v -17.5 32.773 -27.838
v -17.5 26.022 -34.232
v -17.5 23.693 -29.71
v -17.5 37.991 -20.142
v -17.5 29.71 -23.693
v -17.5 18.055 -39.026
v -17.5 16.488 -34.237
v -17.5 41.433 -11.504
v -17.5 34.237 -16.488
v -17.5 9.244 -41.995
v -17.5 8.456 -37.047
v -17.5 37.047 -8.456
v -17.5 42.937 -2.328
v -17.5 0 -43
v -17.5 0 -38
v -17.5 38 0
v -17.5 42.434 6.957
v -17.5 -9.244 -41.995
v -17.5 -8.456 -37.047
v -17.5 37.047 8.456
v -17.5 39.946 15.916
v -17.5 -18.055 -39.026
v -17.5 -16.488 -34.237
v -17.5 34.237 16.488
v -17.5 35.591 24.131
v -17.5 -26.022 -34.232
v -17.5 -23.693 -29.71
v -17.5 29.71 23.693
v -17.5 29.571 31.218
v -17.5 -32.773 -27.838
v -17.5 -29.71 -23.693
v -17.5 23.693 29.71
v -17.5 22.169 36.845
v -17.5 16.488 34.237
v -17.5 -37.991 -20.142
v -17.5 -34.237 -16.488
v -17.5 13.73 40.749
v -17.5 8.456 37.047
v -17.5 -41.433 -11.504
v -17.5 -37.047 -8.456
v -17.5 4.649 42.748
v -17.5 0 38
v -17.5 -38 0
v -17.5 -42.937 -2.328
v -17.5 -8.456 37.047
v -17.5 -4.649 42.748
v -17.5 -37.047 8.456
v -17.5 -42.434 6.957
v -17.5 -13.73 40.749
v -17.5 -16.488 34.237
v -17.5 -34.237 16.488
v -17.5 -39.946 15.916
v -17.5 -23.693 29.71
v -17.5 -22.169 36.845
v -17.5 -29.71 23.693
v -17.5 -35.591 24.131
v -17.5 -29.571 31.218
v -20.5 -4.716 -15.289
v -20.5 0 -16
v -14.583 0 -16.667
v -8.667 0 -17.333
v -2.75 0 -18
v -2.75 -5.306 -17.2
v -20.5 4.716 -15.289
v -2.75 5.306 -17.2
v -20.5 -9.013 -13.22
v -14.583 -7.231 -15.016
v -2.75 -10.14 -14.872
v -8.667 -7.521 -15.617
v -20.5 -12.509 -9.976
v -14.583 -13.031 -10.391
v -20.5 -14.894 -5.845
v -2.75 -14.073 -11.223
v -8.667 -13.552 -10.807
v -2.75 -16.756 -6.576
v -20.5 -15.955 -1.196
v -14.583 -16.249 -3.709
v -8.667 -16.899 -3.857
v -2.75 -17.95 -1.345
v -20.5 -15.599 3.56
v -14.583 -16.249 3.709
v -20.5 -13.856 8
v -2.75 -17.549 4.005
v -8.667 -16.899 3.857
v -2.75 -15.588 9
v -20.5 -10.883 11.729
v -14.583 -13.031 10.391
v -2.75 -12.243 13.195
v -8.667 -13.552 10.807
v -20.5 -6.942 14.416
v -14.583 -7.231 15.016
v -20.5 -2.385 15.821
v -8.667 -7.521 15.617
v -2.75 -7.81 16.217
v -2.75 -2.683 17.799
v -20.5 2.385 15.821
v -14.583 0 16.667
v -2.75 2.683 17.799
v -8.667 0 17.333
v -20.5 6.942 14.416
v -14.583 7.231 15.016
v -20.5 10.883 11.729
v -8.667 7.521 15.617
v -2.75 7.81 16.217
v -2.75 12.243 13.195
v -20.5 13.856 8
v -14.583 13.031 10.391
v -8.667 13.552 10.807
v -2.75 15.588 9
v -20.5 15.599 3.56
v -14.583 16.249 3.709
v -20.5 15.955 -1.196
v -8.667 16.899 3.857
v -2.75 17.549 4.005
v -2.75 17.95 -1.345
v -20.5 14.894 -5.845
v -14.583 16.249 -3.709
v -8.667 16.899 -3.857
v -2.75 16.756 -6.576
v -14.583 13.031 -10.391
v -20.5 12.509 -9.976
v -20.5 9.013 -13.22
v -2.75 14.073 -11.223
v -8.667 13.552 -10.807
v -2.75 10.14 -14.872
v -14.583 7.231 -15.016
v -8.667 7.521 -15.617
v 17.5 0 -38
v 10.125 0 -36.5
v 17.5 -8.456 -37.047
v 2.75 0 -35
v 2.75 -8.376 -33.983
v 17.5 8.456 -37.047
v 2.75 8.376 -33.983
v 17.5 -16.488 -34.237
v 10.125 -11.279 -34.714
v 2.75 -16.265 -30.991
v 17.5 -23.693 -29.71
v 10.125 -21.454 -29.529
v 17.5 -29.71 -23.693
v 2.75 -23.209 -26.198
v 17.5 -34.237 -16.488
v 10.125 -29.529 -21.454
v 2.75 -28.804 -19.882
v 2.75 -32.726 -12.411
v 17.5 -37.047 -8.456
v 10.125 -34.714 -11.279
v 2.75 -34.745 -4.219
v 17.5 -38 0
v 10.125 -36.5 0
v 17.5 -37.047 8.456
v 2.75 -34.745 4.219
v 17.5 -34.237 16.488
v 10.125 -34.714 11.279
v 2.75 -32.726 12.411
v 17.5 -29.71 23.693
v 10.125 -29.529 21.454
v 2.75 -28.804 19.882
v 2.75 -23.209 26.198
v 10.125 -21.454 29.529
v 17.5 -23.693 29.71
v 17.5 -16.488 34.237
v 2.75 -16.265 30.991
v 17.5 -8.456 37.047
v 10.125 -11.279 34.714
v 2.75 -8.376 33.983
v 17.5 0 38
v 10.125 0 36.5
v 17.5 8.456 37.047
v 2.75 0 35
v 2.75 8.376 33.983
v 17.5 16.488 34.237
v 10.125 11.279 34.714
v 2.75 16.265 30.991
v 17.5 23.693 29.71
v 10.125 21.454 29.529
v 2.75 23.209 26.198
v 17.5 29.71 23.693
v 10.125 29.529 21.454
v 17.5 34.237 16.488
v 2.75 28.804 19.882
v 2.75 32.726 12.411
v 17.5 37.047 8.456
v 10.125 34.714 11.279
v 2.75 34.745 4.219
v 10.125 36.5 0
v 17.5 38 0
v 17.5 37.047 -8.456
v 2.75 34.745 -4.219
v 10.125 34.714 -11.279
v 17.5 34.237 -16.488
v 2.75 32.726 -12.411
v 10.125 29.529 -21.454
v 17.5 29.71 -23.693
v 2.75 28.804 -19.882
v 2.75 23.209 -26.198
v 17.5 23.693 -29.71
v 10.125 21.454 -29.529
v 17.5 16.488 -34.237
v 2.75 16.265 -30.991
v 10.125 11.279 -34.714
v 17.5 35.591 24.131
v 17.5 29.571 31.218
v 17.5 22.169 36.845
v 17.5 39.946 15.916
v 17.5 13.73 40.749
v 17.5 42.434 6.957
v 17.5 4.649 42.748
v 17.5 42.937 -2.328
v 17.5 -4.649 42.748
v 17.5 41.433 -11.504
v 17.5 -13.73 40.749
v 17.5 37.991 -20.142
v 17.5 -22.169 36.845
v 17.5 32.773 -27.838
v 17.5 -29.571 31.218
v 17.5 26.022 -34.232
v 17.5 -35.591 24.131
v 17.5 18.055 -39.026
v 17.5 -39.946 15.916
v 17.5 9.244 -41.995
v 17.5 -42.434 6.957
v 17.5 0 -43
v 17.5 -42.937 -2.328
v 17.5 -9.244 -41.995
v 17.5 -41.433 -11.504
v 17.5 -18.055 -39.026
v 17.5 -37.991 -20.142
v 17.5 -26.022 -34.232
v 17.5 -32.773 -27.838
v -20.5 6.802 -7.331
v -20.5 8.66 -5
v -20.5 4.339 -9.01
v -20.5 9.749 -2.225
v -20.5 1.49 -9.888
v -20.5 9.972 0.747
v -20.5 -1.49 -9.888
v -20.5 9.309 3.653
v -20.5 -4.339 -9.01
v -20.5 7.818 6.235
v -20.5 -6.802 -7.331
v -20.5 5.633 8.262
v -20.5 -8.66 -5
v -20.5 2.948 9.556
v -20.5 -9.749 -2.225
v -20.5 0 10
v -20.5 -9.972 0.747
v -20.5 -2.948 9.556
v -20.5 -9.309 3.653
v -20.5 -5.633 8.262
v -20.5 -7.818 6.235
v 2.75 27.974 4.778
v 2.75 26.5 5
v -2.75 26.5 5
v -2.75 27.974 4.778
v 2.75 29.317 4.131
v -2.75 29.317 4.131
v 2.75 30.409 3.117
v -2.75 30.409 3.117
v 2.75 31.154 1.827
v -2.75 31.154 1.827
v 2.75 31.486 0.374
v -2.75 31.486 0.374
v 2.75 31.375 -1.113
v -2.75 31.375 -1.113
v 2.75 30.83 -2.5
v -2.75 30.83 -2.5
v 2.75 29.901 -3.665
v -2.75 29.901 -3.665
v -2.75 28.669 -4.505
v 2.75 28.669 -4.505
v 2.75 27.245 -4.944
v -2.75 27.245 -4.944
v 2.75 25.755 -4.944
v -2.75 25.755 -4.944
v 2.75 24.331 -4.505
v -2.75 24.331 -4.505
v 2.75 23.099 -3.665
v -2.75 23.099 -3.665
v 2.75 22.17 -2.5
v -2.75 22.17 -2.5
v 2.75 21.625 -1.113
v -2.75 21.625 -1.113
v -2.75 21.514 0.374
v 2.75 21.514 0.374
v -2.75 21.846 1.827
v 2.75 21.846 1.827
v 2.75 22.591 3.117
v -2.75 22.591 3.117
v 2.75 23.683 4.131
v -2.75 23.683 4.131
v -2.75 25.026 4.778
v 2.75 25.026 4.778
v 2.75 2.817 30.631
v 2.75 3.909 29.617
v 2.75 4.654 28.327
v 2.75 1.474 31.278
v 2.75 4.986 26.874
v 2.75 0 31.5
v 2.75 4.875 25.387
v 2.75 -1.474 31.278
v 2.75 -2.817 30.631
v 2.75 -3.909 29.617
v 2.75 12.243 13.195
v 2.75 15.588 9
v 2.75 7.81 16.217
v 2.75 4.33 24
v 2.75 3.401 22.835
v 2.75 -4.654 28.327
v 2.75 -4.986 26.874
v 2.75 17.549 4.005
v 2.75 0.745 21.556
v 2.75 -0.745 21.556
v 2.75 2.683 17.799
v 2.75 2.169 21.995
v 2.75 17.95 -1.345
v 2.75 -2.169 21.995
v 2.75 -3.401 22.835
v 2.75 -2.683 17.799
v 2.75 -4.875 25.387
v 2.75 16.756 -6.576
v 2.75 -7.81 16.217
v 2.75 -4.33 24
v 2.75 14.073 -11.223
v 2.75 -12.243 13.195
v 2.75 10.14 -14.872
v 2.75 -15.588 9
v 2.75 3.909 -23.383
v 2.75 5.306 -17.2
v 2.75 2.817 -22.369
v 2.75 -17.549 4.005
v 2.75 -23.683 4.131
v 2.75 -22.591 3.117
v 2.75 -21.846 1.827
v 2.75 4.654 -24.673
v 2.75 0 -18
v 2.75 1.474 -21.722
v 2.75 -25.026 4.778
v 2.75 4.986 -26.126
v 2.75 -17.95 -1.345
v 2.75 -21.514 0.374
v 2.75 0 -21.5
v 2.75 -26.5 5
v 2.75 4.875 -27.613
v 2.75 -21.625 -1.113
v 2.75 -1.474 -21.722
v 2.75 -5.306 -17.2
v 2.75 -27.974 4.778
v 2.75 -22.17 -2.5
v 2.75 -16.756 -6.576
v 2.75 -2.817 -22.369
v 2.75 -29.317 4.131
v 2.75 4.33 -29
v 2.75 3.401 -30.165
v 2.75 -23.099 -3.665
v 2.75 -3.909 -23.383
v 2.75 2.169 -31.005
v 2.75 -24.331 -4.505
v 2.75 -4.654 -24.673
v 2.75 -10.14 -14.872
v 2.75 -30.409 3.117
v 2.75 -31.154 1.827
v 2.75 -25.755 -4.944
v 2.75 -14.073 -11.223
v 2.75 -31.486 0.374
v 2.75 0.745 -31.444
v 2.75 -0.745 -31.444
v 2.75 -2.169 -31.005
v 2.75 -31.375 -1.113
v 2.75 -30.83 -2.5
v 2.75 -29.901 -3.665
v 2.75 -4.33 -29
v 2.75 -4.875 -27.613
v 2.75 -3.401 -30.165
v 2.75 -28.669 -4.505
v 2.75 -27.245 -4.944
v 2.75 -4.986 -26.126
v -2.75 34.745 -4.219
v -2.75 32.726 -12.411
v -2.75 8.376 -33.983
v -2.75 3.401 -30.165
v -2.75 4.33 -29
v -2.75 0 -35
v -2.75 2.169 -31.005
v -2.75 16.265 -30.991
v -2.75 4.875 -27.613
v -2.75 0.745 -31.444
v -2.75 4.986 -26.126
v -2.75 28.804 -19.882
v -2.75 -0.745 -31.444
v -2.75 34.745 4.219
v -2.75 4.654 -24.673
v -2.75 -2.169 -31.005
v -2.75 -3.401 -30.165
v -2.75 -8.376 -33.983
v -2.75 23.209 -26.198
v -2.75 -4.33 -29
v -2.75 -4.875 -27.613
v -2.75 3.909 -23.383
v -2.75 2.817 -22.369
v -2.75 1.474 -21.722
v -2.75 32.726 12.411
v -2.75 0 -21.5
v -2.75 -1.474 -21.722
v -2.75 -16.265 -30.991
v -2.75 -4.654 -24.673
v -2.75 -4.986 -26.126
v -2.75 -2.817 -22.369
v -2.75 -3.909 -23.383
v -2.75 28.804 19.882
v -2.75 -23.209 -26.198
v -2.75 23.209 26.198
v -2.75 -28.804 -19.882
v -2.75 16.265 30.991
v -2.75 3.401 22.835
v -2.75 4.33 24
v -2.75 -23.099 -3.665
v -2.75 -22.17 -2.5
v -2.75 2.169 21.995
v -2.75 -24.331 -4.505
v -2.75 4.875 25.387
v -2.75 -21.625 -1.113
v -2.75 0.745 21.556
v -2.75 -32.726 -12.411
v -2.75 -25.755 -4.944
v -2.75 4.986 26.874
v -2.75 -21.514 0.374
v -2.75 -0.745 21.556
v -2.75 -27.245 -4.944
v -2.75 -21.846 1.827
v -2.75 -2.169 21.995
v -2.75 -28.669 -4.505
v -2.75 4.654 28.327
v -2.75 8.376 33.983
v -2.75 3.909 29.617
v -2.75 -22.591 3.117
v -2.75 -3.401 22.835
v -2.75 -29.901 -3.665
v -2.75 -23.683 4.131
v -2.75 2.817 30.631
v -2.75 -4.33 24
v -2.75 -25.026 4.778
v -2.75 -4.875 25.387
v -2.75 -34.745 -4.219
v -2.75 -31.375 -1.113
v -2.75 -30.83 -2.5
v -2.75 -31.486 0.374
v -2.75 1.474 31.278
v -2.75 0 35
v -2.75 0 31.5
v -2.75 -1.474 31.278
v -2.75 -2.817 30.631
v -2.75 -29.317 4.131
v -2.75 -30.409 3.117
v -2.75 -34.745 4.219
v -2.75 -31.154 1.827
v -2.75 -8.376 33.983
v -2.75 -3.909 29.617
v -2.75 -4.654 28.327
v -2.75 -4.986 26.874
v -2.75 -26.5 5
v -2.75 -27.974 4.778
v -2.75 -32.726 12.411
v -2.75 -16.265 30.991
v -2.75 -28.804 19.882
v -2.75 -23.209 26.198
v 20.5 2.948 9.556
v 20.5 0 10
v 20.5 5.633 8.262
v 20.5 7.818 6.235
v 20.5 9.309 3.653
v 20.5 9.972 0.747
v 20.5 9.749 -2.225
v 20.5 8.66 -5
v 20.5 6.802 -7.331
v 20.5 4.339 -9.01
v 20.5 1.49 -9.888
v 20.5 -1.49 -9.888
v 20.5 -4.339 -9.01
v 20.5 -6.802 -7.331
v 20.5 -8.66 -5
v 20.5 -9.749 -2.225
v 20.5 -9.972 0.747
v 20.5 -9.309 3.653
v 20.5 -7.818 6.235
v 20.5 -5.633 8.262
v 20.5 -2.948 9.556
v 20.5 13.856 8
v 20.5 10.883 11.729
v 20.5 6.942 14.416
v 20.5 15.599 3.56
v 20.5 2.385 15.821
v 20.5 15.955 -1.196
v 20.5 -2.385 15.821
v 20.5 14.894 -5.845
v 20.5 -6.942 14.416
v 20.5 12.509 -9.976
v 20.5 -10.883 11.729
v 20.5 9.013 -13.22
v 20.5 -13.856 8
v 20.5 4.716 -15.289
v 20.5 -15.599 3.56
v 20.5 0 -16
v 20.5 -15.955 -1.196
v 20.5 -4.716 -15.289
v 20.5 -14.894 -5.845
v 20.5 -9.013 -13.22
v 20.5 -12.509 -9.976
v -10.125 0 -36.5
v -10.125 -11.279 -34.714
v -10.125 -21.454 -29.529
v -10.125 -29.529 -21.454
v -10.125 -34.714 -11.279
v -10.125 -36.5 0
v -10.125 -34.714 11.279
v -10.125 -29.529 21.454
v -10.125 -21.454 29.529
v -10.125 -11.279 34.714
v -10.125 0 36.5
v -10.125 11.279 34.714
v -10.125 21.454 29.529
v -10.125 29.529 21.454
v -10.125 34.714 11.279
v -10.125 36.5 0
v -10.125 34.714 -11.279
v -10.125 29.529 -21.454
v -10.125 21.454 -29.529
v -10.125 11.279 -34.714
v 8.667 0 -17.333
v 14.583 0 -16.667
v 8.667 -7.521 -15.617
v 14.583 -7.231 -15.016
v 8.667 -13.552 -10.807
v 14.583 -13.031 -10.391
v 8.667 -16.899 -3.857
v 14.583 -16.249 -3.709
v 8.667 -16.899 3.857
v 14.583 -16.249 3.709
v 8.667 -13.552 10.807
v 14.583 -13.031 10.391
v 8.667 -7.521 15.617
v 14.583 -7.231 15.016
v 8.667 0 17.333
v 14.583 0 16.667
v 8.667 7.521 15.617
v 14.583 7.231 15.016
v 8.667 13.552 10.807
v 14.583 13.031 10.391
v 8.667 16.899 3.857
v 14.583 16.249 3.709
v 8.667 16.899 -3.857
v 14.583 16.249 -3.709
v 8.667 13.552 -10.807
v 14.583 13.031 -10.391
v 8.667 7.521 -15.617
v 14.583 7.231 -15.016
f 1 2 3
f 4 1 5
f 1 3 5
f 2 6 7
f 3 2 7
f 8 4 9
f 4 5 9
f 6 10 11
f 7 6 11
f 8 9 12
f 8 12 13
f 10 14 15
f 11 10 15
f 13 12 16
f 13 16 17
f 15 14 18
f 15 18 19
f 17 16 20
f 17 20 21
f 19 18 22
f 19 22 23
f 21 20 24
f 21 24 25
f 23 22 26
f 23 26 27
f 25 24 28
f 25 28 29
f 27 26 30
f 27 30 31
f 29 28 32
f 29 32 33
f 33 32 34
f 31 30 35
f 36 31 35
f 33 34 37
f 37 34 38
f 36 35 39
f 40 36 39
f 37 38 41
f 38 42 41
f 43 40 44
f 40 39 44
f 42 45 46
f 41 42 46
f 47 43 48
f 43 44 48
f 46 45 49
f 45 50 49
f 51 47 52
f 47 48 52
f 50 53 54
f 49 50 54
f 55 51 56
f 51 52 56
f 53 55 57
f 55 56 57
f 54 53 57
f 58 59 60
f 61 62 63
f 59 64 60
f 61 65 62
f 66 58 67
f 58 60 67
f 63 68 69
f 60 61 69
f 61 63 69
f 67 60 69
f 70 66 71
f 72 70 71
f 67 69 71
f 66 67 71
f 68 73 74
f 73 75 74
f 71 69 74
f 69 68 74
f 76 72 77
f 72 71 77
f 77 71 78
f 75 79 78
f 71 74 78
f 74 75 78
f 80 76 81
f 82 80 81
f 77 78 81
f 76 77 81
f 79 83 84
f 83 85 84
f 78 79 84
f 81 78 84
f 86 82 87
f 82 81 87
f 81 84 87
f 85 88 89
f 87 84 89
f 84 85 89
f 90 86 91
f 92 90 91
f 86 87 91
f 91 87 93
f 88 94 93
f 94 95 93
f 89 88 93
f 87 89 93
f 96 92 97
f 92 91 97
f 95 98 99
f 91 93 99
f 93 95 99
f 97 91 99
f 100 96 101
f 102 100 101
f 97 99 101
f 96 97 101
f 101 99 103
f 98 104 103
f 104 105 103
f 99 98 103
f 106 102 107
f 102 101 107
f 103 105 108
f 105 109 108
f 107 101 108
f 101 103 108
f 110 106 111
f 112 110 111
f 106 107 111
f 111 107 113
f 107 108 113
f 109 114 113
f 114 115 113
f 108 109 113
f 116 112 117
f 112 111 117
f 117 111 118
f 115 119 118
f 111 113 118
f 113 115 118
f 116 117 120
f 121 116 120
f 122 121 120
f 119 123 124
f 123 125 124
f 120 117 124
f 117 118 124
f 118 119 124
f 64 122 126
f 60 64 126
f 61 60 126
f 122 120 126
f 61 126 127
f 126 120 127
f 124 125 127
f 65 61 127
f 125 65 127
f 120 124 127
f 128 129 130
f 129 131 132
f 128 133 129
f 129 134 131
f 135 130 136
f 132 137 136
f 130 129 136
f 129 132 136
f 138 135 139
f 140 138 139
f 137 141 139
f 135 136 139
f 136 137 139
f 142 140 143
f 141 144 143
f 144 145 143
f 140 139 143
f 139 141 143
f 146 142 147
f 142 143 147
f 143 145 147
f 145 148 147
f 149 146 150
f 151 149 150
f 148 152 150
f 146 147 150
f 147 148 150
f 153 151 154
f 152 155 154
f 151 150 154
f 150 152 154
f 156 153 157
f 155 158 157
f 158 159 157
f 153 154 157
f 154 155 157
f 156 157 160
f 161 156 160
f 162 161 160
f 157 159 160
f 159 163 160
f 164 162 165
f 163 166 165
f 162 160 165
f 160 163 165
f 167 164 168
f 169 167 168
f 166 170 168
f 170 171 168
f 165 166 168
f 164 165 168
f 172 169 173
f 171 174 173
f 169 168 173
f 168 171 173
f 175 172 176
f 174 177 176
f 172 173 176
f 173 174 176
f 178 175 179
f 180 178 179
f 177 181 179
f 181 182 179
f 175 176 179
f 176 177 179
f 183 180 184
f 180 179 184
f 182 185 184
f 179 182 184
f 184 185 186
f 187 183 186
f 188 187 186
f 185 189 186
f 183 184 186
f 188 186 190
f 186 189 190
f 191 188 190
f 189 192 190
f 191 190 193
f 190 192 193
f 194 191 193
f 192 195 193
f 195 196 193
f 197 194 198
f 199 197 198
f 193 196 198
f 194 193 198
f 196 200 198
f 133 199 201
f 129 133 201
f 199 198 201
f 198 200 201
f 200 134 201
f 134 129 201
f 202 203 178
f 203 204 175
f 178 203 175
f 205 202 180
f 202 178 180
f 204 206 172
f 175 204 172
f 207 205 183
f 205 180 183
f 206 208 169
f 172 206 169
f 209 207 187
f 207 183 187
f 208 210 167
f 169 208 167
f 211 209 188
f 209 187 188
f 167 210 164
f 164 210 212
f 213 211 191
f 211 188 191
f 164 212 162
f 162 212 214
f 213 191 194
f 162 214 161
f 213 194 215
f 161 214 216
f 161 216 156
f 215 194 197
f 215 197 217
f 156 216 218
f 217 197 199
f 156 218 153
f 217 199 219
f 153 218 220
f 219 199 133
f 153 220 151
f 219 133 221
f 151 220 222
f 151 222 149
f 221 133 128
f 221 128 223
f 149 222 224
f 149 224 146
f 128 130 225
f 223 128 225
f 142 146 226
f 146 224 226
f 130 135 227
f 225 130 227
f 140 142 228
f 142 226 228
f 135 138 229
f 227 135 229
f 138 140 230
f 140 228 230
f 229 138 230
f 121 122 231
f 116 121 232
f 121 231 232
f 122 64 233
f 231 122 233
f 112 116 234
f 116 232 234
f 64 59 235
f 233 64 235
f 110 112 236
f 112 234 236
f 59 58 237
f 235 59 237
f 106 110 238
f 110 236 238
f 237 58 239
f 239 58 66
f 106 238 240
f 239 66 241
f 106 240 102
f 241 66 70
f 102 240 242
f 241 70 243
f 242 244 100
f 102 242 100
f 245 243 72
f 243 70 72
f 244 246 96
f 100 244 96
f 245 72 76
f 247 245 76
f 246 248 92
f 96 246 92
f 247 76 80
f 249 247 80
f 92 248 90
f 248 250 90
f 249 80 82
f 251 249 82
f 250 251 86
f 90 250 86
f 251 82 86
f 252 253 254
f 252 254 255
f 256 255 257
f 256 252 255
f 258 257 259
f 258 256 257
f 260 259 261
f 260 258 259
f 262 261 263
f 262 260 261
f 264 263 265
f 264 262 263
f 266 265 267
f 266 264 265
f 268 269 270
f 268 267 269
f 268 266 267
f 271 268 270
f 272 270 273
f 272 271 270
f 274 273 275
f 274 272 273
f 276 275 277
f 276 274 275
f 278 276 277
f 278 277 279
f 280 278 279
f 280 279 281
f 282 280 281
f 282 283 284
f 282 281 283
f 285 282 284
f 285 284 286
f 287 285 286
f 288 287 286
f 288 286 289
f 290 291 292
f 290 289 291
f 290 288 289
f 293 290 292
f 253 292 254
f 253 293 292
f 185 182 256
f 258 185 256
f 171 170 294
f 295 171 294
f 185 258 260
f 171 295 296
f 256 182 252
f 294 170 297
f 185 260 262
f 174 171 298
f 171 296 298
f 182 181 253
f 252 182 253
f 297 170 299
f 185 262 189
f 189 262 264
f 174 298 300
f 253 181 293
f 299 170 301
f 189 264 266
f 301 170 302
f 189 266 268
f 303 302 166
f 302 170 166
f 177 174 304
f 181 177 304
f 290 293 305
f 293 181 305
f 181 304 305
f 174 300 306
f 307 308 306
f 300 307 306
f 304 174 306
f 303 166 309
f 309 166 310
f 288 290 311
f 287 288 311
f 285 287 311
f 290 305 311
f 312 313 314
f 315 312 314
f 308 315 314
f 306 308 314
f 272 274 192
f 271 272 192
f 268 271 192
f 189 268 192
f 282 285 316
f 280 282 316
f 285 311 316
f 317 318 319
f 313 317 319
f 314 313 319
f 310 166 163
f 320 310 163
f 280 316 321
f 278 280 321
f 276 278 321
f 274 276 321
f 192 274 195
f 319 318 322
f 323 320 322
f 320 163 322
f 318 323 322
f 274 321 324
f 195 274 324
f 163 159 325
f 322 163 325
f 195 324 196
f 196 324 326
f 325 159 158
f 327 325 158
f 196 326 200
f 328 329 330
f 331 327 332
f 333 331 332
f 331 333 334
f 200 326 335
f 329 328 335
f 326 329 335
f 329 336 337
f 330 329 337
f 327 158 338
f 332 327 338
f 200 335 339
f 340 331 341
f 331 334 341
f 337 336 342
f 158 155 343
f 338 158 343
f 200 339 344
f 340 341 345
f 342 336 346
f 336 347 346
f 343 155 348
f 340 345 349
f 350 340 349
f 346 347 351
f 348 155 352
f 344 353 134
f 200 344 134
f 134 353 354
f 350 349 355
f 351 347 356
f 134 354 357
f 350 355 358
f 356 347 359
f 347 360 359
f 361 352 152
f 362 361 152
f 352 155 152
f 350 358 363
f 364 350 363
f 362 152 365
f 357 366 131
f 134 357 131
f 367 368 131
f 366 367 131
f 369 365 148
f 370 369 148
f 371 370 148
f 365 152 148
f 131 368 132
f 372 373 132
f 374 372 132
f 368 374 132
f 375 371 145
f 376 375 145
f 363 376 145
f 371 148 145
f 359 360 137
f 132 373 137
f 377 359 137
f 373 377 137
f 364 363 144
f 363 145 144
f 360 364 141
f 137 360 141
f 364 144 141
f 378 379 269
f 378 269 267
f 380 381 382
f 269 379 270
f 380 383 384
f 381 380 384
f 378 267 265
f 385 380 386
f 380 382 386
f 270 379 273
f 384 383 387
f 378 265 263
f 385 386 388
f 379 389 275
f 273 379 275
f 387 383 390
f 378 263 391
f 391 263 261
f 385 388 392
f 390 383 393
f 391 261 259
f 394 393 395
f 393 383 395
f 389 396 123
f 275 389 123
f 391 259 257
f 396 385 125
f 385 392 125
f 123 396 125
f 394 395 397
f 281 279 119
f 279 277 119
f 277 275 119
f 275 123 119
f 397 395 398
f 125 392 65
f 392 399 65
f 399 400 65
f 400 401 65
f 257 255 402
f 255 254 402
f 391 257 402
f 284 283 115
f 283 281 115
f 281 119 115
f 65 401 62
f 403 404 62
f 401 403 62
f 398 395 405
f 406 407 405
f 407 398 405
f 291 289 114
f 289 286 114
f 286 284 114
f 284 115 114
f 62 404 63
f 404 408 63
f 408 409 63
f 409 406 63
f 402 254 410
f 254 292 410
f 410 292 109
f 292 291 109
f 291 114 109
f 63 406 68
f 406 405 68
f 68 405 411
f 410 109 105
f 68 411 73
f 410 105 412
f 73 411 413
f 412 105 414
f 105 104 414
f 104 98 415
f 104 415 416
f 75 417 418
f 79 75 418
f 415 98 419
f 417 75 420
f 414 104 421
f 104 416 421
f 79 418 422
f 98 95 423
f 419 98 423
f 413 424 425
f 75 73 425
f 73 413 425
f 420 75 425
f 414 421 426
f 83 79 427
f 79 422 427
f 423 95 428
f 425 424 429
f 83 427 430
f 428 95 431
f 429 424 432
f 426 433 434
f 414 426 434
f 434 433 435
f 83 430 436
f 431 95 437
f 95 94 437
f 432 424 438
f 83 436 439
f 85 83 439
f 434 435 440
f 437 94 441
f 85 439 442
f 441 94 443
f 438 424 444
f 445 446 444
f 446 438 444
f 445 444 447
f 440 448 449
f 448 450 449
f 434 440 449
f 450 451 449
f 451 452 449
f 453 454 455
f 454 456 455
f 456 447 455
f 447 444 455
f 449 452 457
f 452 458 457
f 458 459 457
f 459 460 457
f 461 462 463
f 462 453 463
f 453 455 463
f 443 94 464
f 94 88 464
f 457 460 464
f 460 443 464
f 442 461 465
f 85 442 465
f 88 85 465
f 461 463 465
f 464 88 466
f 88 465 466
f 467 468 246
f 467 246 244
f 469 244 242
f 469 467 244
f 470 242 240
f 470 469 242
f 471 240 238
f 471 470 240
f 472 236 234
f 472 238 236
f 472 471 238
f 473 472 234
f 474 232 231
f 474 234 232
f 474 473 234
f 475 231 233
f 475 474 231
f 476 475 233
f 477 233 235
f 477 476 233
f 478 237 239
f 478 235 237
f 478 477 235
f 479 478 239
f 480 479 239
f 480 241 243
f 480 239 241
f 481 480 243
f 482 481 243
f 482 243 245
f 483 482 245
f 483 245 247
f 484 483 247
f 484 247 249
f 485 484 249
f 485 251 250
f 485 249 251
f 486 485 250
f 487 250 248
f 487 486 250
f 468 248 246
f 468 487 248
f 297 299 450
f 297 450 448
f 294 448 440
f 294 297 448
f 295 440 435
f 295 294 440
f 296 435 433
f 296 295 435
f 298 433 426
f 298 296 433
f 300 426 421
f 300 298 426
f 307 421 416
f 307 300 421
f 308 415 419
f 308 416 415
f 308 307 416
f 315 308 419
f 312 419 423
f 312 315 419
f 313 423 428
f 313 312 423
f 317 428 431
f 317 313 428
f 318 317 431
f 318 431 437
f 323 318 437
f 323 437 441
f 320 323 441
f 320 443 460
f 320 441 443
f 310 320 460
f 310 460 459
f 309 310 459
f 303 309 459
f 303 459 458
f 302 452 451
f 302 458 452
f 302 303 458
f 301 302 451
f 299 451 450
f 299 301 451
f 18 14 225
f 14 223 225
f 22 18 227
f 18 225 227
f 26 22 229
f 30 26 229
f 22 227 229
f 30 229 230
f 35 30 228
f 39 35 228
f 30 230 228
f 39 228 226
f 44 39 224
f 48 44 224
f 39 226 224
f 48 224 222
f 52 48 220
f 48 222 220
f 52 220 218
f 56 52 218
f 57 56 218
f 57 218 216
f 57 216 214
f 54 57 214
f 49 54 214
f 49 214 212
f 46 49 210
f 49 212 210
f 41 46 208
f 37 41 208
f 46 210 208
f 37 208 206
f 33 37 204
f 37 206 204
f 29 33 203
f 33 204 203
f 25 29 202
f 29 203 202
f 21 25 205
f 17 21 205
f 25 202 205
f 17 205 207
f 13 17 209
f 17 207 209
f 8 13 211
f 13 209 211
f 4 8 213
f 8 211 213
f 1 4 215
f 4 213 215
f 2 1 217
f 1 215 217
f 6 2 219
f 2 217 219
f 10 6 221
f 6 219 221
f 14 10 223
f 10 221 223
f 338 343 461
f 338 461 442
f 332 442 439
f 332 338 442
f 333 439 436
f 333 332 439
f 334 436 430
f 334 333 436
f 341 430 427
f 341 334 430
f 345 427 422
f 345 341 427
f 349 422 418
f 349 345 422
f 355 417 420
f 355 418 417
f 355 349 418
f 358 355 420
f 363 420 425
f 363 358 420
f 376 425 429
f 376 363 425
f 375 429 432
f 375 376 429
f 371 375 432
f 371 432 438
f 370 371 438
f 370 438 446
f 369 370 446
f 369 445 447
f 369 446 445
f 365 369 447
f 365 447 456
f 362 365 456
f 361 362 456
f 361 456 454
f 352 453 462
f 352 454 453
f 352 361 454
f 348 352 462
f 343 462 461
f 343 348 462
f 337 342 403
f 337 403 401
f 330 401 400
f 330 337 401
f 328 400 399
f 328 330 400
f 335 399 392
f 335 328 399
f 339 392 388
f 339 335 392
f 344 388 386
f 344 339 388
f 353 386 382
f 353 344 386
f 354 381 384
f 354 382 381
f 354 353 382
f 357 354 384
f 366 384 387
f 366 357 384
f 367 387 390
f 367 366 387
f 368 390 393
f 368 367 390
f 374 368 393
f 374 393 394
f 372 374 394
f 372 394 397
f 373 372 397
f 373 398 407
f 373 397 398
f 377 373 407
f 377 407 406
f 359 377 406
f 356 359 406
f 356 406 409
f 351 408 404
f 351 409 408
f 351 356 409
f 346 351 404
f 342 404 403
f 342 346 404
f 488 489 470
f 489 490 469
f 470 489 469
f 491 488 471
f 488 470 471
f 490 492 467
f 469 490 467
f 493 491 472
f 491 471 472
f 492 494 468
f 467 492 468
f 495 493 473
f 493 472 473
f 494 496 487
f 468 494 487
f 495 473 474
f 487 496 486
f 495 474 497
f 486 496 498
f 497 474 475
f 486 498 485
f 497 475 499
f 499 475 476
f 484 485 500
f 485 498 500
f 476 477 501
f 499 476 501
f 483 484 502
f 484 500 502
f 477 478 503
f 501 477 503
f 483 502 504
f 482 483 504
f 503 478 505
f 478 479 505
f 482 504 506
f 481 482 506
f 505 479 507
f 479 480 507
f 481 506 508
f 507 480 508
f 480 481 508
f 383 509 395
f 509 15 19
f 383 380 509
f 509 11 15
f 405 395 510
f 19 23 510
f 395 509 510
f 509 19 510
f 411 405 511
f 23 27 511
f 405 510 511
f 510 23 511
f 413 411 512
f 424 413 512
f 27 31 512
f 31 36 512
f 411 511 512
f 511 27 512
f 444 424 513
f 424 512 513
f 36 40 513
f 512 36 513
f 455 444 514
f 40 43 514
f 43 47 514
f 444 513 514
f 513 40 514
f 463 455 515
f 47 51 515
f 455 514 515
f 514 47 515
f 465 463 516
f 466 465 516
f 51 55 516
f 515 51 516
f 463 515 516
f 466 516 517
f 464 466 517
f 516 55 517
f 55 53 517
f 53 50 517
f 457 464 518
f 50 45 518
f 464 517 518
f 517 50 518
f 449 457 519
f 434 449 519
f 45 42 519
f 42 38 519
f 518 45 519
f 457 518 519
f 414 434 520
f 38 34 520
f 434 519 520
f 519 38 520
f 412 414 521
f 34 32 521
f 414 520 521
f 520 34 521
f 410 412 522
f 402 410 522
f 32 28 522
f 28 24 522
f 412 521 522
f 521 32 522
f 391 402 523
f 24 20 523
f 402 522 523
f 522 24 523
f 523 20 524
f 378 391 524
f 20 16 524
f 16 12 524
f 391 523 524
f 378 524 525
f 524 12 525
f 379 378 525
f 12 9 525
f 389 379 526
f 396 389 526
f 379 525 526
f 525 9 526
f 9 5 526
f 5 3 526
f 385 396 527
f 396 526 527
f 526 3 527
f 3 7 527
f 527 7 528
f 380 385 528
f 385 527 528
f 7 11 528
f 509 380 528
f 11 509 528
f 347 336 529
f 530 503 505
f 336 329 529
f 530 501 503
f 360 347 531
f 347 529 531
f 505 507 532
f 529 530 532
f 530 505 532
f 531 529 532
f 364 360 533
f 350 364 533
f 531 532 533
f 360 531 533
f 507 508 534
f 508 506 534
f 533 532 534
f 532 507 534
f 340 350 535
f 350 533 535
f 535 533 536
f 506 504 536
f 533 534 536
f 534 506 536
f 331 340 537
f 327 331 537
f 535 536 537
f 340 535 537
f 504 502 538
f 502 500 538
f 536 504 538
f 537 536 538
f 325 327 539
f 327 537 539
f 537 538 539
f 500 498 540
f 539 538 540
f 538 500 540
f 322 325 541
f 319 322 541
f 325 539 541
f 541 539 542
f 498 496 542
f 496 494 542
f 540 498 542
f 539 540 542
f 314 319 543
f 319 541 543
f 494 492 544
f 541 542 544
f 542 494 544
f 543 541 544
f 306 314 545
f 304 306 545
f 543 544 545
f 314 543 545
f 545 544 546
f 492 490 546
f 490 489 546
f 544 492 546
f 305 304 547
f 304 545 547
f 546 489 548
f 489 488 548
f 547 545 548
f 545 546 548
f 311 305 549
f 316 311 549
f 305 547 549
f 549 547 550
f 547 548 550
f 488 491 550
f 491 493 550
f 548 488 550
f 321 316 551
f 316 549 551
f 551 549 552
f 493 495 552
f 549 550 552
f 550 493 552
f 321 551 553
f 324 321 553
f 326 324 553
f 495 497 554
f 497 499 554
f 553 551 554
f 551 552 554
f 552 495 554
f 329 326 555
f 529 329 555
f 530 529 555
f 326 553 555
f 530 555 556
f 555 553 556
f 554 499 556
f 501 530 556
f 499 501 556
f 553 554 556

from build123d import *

# Parameters (mm, degrees)
CUT_EXTRUDE1_DEPTH      = 74.341666193
CUT_EXTRUDE1_DEPTH_BACK = 74.341666193
SKETCH4_R               = 5
CUT_EXTRUDE2_DEPTH      = 74.341666193
CUT_EXTRUDE2_DEPTH_BACK = 74.341666193
SKETCH5_R               = 10


with BuildPart() as part:
    # Sketch1 → Revolve1 (revolve)
    with BuildSketch(Plane(origin=(0, 0, 0), x_dir=(1, 0, 0), z_dir=(0, 1, 0))):
        Polygon((20.5, 0), (-20.5, 0), (-20.5, 16), (-2.75, 18), (-2.75, 35), (-17.5, 38), (-17.5, 43), (17.5, 43), (17.5, 38), (2.75, 35), (2.75, 18), (20.5, 16), align=None)
    revolve(axis=Axis((20.5, 0, 0), (-1, 0, 0)))

    # Sketch4 → Cut-Extrude1 (cut, two sides: drawn at the far end of the back side and taken through both)
    with BuildSketch(Plane.ZY.offset(20.5).offset(-CUT_EXTRUDE1_DEPTH_BACK)):
        with Locations((0, 26.5)):
            Circle(SKETCH4_R)
        with Locations((26.5, 0)):
            Circle(SKETCH4_R)
        with Locations((0, -26.5)):
            Circle(SKETCH4_R)
        with Locations((-26.5, 0)):
            Circle(SKETCH4_R)
    extrude(amount=CUT_EXTRUDE1_DEPTH + CUT_EXTRUDE1_DEPTH_BACK, mode=Mode.SUBTRACT)

    # Sketch5 → Cut-Extrude2 (cut, two sides: drawn at the far end of the back side and taken through both)
    with BuildSketch(Plane.ZY.offset(20.5).offset(-CUT_EXTRUDE2_DEPTH_BACK)):
        Circle(SKETCH5_R)
    extrude(amount=CUT_EXTRUDE2_DEPTH + CUT_EXTRUDE2_DEPTH_BACK, mode=Mode.SUBTRACT)


solid = part.part
